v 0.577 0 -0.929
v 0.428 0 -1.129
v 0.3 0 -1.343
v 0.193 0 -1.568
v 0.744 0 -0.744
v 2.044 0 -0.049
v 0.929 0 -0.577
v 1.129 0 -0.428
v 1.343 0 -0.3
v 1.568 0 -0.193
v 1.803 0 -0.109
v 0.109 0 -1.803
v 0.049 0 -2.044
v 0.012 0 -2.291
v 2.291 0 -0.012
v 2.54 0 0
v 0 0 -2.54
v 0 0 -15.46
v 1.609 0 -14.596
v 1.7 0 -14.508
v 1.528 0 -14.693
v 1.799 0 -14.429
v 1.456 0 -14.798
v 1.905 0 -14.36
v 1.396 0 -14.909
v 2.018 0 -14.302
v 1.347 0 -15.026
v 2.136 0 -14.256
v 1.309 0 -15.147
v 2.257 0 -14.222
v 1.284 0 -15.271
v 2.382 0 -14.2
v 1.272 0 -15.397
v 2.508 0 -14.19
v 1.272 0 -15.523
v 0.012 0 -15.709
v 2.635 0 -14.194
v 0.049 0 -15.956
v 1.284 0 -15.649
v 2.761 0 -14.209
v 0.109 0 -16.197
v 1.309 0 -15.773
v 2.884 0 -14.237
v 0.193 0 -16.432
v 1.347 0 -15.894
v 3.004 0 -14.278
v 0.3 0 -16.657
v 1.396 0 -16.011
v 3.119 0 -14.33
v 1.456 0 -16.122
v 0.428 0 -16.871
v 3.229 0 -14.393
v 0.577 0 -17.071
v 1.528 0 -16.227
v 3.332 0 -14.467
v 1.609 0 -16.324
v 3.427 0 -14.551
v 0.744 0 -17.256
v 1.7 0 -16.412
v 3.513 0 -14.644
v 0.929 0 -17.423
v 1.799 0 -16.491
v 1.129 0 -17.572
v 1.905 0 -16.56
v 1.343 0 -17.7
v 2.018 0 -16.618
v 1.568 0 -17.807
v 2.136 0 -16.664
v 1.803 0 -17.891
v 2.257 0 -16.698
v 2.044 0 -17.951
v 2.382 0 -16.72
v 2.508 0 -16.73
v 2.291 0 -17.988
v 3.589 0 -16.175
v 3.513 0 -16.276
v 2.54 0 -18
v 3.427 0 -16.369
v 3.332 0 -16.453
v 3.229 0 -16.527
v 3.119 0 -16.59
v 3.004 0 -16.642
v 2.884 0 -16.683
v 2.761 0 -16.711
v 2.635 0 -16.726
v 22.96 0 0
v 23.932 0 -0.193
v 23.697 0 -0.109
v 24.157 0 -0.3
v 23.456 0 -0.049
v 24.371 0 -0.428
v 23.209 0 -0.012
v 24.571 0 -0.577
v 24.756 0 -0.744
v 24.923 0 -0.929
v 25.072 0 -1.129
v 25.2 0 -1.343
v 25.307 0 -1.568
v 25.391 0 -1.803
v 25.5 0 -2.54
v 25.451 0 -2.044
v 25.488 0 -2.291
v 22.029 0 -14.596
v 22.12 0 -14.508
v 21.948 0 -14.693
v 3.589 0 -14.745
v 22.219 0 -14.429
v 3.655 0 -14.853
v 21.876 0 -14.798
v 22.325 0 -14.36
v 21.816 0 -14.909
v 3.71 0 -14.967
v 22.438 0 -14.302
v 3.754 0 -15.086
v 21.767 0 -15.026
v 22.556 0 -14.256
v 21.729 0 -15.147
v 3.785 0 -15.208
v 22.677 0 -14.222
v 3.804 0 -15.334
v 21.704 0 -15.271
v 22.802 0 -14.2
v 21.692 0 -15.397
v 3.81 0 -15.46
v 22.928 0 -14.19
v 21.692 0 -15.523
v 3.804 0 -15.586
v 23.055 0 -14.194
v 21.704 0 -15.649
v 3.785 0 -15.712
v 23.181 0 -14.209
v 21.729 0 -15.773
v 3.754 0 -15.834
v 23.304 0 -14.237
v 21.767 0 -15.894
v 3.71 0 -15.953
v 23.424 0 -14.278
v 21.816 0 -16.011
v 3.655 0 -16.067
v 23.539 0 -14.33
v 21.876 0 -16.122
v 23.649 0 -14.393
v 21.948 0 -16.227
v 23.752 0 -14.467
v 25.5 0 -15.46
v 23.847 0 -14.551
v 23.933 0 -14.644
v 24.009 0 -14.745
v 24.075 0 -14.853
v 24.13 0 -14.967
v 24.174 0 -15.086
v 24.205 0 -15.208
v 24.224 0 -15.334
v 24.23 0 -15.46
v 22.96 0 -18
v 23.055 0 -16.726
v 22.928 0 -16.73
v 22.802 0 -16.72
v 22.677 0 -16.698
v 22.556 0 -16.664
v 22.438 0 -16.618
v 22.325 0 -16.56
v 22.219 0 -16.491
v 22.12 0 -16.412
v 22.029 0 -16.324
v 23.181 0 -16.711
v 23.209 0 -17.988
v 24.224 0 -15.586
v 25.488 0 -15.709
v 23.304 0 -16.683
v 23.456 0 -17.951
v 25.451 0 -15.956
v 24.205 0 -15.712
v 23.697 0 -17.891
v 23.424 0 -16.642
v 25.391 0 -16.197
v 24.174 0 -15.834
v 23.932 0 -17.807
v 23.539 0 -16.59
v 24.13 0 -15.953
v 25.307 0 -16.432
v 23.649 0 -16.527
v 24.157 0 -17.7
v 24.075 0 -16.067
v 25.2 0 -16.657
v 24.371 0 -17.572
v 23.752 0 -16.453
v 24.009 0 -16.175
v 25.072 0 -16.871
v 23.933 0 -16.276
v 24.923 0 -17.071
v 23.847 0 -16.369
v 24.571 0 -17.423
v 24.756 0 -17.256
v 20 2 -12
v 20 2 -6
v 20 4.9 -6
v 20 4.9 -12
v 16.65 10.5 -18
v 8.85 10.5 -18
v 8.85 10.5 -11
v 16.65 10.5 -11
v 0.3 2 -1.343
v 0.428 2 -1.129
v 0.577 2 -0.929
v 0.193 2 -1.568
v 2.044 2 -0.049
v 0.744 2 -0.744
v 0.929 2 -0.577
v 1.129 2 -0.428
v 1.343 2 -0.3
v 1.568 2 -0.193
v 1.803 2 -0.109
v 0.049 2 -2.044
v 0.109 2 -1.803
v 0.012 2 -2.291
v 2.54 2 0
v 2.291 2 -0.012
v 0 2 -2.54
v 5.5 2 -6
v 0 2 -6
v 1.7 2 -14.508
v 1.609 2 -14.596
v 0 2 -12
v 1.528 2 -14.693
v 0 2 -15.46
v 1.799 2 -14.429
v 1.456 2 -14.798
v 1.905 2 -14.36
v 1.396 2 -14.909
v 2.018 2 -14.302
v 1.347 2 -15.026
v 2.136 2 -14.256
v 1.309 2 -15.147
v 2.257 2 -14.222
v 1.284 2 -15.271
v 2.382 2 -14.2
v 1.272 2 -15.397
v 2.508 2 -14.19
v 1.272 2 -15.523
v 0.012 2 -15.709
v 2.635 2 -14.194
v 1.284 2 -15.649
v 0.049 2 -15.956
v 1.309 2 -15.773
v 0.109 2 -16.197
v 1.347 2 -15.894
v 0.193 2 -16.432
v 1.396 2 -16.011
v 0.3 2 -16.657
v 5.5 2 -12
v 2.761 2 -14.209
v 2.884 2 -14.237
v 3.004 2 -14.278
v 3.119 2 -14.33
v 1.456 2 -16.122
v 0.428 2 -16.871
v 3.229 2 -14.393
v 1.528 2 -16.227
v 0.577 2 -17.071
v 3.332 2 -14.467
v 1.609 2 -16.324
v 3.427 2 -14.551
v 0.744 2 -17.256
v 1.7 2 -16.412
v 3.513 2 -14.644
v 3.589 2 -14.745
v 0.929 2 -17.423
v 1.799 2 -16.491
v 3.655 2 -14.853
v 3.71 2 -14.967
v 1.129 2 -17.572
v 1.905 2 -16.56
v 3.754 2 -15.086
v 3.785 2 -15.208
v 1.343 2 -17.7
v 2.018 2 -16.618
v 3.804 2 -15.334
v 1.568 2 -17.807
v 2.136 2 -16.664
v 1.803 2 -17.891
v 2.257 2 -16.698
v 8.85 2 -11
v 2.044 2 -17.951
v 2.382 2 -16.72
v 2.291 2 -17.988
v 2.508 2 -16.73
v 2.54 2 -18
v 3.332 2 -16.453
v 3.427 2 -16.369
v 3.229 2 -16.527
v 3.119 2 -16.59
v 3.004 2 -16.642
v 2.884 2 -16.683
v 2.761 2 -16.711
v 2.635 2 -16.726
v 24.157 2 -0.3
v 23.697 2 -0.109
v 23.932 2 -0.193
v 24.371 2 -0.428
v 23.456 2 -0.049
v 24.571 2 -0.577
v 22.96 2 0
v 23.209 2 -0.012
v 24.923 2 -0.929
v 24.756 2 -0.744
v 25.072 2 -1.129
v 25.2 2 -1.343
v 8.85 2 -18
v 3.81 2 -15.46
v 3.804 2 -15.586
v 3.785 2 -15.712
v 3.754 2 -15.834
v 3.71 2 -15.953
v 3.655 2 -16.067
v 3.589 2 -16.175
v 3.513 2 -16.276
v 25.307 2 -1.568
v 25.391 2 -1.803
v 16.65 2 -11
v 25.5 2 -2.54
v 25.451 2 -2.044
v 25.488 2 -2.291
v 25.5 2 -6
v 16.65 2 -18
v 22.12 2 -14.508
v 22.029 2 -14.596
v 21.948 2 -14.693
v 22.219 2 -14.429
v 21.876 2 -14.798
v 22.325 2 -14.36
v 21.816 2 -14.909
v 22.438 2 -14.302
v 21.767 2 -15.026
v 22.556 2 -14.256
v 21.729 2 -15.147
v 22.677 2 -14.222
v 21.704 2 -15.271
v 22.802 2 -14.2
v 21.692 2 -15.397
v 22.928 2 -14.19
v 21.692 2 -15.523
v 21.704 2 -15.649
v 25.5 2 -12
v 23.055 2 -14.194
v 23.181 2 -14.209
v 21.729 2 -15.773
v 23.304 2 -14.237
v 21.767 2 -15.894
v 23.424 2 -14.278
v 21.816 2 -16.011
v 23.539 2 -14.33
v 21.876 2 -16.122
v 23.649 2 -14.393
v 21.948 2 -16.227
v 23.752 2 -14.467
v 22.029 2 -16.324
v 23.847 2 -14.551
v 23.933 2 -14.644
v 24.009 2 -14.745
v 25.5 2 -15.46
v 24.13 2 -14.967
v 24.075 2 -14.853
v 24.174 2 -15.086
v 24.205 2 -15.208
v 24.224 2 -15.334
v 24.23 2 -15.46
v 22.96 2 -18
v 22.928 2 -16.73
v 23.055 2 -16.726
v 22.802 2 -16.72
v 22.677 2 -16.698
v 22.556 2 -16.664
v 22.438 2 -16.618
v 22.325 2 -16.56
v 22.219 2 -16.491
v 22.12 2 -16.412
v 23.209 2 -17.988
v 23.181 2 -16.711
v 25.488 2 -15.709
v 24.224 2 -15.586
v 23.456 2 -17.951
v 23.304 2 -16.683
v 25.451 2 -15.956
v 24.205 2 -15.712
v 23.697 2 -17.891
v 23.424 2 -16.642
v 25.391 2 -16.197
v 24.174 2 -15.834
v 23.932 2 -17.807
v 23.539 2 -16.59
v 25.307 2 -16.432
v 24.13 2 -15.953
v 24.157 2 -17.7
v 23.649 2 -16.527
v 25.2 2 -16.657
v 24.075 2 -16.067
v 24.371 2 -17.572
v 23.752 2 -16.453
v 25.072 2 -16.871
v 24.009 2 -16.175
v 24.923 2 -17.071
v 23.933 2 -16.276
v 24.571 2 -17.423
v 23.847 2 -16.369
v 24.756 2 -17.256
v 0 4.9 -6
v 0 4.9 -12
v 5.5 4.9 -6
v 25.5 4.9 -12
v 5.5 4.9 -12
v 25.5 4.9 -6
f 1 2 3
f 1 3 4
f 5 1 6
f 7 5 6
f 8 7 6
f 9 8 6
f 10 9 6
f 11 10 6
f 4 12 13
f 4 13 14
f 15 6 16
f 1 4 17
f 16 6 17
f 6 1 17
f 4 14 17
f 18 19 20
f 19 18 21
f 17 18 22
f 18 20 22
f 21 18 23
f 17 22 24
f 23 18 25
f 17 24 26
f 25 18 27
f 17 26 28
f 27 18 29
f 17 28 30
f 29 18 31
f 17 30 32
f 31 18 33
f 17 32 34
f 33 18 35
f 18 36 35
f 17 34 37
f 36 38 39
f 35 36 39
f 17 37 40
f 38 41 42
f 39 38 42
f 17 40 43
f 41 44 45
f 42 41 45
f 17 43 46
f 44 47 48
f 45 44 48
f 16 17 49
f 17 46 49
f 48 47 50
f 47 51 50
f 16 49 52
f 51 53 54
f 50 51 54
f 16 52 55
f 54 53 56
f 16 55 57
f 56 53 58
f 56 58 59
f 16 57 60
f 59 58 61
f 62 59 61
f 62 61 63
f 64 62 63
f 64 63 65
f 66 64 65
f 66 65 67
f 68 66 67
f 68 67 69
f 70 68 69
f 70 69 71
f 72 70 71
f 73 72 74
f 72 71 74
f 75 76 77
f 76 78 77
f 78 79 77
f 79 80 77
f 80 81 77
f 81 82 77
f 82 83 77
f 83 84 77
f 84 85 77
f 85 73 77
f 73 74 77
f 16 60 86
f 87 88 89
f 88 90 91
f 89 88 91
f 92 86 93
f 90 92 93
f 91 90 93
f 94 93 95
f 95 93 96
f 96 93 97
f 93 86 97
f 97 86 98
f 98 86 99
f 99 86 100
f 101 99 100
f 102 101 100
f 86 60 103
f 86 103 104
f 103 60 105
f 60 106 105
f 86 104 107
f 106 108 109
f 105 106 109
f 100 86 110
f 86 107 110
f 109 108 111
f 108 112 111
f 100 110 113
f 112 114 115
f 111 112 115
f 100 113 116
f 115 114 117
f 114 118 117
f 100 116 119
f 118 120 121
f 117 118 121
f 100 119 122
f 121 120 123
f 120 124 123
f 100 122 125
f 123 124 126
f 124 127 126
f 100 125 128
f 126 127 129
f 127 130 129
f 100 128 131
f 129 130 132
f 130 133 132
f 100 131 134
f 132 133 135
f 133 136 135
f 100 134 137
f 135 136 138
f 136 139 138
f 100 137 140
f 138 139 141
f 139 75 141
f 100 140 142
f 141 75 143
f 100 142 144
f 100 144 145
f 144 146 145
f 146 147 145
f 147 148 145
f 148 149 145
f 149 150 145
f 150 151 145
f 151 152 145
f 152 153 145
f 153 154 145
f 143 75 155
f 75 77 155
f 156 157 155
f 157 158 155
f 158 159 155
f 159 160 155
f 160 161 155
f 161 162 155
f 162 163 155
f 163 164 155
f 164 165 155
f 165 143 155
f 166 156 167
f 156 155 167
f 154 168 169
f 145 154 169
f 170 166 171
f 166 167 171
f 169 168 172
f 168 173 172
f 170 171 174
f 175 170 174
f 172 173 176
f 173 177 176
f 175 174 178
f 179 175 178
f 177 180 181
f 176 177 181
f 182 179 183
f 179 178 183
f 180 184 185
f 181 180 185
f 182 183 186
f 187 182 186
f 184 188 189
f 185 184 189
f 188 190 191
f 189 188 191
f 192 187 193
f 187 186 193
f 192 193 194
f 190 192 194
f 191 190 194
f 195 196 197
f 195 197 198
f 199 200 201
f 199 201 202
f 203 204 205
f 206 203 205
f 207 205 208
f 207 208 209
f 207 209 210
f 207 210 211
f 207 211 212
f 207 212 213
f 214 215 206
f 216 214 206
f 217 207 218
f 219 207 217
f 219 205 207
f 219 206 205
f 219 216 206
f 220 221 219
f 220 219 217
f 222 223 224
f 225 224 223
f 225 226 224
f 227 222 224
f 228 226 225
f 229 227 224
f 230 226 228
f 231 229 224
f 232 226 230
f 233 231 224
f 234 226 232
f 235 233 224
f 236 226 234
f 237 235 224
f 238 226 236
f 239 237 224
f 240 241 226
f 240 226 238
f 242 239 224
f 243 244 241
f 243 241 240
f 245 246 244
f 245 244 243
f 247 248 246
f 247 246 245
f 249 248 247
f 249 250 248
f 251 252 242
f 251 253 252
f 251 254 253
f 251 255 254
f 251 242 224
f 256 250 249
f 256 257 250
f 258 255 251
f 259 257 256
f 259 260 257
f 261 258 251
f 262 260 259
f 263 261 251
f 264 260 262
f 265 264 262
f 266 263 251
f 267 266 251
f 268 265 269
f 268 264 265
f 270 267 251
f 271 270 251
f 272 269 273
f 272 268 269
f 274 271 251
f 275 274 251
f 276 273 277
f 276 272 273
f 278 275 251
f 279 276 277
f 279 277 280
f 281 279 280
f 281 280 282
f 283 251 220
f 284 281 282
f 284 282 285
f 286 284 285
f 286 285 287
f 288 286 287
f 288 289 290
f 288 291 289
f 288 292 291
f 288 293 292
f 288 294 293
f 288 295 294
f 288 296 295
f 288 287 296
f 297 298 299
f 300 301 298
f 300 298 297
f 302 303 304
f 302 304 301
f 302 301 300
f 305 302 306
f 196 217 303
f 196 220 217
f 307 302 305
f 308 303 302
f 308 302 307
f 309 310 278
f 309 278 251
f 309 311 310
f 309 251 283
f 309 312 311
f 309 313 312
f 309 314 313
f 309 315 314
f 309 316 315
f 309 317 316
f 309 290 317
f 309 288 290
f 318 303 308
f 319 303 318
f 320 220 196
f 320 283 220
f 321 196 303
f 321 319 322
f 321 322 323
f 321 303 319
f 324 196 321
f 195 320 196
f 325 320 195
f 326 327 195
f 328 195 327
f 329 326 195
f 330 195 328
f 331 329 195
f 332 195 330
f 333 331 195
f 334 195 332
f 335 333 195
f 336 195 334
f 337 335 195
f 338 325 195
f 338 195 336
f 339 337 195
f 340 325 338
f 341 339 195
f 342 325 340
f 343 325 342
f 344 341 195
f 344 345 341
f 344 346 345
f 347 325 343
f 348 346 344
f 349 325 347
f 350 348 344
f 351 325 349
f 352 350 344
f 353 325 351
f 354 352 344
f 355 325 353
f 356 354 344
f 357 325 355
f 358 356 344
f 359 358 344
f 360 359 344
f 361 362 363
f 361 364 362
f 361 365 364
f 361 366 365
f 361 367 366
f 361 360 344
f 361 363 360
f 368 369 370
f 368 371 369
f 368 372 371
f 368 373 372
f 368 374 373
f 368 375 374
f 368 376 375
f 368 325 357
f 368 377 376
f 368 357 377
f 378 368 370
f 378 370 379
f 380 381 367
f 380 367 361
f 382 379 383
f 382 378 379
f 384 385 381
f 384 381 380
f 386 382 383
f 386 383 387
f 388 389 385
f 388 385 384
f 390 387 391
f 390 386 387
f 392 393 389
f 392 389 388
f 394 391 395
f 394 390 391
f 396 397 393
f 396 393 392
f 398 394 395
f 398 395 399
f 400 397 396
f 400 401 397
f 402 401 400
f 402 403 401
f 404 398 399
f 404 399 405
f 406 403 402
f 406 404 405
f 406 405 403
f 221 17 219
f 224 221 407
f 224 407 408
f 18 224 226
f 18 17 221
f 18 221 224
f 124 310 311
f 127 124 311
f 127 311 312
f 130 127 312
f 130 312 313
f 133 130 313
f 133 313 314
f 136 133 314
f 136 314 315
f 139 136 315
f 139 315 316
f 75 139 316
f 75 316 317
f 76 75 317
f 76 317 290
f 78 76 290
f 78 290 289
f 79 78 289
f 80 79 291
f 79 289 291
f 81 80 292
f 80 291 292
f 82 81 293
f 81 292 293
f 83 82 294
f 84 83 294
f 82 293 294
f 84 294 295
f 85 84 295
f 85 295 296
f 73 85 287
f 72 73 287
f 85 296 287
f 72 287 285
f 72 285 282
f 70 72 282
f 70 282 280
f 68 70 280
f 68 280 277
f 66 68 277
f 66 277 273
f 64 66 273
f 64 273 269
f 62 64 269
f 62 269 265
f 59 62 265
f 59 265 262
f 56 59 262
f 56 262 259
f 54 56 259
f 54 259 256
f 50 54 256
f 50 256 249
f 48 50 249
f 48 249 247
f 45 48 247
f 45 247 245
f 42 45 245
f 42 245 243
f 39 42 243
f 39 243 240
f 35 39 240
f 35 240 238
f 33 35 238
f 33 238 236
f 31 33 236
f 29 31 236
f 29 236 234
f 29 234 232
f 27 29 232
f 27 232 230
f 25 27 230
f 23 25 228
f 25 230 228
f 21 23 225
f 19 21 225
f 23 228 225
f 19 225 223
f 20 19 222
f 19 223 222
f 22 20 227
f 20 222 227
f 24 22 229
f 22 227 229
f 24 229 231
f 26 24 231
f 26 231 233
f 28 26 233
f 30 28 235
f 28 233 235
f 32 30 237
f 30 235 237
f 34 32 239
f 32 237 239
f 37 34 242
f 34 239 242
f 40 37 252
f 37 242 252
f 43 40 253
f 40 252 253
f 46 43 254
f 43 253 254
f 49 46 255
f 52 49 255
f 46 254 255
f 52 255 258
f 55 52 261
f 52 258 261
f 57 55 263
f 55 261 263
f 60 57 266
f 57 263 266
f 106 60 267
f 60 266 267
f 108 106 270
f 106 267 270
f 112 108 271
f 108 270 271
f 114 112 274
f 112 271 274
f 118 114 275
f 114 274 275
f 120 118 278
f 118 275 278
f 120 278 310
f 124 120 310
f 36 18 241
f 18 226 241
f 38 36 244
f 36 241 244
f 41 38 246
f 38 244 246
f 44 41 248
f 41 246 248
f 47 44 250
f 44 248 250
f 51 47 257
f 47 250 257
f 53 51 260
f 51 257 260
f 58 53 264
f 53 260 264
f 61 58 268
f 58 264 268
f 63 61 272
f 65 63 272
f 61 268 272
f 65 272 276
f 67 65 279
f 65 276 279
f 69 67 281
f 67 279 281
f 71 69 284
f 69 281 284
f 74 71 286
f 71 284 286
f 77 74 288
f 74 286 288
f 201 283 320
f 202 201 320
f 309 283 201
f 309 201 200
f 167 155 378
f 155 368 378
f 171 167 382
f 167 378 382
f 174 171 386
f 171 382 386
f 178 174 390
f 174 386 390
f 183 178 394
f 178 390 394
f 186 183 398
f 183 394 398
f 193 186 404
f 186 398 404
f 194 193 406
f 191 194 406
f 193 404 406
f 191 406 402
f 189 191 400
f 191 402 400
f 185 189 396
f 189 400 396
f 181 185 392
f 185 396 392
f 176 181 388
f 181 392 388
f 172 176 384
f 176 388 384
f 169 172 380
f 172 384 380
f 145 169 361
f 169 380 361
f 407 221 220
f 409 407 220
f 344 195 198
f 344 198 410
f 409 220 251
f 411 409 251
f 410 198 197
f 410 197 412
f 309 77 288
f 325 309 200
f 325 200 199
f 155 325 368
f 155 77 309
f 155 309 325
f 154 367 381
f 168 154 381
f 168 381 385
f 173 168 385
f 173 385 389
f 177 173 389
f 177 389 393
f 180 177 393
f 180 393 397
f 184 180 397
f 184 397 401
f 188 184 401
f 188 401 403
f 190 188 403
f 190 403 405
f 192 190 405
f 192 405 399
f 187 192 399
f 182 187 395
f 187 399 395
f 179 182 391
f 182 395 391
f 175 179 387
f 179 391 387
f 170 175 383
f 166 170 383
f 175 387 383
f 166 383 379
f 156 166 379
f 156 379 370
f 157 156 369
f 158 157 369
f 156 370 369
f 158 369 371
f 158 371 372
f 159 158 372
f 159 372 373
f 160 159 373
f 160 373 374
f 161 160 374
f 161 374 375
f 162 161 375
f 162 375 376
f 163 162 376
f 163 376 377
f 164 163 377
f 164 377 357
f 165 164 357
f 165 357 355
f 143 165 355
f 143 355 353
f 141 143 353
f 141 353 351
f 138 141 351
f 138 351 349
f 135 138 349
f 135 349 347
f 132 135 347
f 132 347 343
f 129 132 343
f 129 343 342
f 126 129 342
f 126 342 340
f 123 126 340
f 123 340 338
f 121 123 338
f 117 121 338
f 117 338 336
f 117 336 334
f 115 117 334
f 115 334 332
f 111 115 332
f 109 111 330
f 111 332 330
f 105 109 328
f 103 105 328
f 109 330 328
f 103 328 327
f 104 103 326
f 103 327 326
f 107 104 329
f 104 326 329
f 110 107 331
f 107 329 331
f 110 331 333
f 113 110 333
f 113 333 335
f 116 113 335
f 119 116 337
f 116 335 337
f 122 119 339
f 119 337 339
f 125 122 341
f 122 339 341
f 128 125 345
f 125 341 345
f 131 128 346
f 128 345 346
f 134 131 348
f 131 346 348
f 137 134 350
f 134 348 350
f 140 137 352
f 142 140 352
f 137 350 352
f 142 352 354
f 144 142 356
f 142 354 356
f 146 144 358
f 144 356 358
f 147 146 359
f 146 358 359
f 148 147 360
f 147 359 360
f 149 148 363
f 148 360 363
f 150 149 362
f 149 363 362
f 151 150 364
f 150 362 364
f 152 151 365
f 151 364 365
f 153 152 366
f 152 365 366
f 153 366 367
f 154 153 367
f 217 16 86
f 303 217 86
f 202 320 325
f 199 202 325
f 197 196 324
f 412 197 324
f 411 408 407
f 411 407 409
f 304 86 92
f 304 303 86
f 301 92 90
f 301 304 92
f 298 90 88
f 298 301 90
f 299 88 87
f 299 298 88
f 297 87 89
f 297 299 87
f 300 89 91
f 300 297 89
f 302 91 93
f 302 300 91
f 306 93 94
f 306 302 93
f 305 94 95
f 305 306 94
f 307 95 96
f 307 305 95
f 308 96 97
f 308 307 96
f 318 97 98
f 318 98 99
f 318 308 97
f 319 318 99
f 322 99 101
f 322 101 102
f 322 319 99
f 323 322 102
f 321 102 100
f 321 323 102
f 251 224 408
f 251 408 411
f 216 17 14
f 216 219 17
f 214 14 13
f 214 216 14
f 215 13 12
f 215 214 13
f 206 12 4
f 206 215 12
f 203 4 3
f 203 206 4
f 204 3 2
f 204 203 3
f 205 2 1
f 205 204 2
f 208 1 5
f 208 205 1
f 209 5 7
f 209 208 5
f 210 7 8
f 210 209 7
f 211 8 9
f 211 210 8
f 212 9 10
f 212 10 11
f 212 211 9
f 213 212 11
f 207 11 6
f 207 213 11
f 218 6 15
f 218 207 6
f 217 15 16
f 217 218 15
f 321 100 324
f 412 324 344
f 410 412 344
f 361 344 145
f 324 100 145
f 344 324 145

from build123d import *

# Parameters (mm, degrees)
SKETCH1_W           = 25.5
SKETCH1_H           = 18
BOSS_EXTRUDE1_DEPTH = 2
SKETCH2_R           = 1.27
CUT_EXTRUDE1_DEPTH  = 3
SKETCH3_W           = 5.5
SKETCH3_H           = 6
BOSS_EXTRUDE2_DEPTH = 2.9
SKETCH4_W           = 7.8
SKETCH4_H           = 7
BOSS_EXTRUDE3_DEPTH = 8.5
FILLET1_R           = 2.54


with BuildPart() as part:
    # Sketch1 → Boss-Extrude1 (new body)
    with BuildSketch(Plane(origin=(0, 0, 0), x_dir=(1, 0, 0), z_dir=(0, 1, 0))):
        with Locations((12.75, 9)):
            Rectangle(SKETCH1_W, SKETCH1_H)
    extrude(amount=BOSS_EXTRUDE1_DEPTH)

    # Sketch2 → Cut-Extrude1 (cut, through all)
    with BuildSketch(Plane(origin=(0, 2, 0), x_dir=(1, 0, 0), z_dir=(0, 1, 0))):
        with Locations((2.54, 15.46)):
            Circle(SKETCH2_R)
        with Locations((22.96, 15.46)):
            Circle(SKETCH2_R)
    extrude(amount=-CUT_EXTRUDE1_DEPTH, mode=Mode.SUBTRACT)

    # Sketch3 → Boss-Extrude2 (add)
    with BuildSketch(Plane(origin=(0, 2, 0), x_dir=(1, 0, 0), z_dir=(0, 1, 0))):
        with Locations((2.75, 9)):
            Rectangle(SKETCH3_W, SKETCH3_H)
        with Locations((22.75, 9)):
            Rectangle(SKETCH3_W, SKETCH3_H)
    extrude(amount=BOSS_EXTRUDE2_DEPTH)

    # Sketch4 → Boss-Extrude3 (add)
    with BuildSketch(Plane(origin=(0, 2, 0), x_dir=(1, 0, 0), z_dir=(0, 1, 0))):
        with Locations((12.75, 14.5)):
            Rectangle(SKETCH4_W, SKETCH4_H)
    extrude(amount=BOSS_EXTRUDE3_DEPTH)

    # Fillet1
    fillet1_edges = [part.edges().sort_by_distance(p)[0] for p in [
        (0, 1, -18),
        (25.5, 1, -18),
        (25.5, 1, 0),
        (0, 1, 0),
    ]]
    fillet(fillet1_edges, radius=FILLET1_R)


solid = part.part
